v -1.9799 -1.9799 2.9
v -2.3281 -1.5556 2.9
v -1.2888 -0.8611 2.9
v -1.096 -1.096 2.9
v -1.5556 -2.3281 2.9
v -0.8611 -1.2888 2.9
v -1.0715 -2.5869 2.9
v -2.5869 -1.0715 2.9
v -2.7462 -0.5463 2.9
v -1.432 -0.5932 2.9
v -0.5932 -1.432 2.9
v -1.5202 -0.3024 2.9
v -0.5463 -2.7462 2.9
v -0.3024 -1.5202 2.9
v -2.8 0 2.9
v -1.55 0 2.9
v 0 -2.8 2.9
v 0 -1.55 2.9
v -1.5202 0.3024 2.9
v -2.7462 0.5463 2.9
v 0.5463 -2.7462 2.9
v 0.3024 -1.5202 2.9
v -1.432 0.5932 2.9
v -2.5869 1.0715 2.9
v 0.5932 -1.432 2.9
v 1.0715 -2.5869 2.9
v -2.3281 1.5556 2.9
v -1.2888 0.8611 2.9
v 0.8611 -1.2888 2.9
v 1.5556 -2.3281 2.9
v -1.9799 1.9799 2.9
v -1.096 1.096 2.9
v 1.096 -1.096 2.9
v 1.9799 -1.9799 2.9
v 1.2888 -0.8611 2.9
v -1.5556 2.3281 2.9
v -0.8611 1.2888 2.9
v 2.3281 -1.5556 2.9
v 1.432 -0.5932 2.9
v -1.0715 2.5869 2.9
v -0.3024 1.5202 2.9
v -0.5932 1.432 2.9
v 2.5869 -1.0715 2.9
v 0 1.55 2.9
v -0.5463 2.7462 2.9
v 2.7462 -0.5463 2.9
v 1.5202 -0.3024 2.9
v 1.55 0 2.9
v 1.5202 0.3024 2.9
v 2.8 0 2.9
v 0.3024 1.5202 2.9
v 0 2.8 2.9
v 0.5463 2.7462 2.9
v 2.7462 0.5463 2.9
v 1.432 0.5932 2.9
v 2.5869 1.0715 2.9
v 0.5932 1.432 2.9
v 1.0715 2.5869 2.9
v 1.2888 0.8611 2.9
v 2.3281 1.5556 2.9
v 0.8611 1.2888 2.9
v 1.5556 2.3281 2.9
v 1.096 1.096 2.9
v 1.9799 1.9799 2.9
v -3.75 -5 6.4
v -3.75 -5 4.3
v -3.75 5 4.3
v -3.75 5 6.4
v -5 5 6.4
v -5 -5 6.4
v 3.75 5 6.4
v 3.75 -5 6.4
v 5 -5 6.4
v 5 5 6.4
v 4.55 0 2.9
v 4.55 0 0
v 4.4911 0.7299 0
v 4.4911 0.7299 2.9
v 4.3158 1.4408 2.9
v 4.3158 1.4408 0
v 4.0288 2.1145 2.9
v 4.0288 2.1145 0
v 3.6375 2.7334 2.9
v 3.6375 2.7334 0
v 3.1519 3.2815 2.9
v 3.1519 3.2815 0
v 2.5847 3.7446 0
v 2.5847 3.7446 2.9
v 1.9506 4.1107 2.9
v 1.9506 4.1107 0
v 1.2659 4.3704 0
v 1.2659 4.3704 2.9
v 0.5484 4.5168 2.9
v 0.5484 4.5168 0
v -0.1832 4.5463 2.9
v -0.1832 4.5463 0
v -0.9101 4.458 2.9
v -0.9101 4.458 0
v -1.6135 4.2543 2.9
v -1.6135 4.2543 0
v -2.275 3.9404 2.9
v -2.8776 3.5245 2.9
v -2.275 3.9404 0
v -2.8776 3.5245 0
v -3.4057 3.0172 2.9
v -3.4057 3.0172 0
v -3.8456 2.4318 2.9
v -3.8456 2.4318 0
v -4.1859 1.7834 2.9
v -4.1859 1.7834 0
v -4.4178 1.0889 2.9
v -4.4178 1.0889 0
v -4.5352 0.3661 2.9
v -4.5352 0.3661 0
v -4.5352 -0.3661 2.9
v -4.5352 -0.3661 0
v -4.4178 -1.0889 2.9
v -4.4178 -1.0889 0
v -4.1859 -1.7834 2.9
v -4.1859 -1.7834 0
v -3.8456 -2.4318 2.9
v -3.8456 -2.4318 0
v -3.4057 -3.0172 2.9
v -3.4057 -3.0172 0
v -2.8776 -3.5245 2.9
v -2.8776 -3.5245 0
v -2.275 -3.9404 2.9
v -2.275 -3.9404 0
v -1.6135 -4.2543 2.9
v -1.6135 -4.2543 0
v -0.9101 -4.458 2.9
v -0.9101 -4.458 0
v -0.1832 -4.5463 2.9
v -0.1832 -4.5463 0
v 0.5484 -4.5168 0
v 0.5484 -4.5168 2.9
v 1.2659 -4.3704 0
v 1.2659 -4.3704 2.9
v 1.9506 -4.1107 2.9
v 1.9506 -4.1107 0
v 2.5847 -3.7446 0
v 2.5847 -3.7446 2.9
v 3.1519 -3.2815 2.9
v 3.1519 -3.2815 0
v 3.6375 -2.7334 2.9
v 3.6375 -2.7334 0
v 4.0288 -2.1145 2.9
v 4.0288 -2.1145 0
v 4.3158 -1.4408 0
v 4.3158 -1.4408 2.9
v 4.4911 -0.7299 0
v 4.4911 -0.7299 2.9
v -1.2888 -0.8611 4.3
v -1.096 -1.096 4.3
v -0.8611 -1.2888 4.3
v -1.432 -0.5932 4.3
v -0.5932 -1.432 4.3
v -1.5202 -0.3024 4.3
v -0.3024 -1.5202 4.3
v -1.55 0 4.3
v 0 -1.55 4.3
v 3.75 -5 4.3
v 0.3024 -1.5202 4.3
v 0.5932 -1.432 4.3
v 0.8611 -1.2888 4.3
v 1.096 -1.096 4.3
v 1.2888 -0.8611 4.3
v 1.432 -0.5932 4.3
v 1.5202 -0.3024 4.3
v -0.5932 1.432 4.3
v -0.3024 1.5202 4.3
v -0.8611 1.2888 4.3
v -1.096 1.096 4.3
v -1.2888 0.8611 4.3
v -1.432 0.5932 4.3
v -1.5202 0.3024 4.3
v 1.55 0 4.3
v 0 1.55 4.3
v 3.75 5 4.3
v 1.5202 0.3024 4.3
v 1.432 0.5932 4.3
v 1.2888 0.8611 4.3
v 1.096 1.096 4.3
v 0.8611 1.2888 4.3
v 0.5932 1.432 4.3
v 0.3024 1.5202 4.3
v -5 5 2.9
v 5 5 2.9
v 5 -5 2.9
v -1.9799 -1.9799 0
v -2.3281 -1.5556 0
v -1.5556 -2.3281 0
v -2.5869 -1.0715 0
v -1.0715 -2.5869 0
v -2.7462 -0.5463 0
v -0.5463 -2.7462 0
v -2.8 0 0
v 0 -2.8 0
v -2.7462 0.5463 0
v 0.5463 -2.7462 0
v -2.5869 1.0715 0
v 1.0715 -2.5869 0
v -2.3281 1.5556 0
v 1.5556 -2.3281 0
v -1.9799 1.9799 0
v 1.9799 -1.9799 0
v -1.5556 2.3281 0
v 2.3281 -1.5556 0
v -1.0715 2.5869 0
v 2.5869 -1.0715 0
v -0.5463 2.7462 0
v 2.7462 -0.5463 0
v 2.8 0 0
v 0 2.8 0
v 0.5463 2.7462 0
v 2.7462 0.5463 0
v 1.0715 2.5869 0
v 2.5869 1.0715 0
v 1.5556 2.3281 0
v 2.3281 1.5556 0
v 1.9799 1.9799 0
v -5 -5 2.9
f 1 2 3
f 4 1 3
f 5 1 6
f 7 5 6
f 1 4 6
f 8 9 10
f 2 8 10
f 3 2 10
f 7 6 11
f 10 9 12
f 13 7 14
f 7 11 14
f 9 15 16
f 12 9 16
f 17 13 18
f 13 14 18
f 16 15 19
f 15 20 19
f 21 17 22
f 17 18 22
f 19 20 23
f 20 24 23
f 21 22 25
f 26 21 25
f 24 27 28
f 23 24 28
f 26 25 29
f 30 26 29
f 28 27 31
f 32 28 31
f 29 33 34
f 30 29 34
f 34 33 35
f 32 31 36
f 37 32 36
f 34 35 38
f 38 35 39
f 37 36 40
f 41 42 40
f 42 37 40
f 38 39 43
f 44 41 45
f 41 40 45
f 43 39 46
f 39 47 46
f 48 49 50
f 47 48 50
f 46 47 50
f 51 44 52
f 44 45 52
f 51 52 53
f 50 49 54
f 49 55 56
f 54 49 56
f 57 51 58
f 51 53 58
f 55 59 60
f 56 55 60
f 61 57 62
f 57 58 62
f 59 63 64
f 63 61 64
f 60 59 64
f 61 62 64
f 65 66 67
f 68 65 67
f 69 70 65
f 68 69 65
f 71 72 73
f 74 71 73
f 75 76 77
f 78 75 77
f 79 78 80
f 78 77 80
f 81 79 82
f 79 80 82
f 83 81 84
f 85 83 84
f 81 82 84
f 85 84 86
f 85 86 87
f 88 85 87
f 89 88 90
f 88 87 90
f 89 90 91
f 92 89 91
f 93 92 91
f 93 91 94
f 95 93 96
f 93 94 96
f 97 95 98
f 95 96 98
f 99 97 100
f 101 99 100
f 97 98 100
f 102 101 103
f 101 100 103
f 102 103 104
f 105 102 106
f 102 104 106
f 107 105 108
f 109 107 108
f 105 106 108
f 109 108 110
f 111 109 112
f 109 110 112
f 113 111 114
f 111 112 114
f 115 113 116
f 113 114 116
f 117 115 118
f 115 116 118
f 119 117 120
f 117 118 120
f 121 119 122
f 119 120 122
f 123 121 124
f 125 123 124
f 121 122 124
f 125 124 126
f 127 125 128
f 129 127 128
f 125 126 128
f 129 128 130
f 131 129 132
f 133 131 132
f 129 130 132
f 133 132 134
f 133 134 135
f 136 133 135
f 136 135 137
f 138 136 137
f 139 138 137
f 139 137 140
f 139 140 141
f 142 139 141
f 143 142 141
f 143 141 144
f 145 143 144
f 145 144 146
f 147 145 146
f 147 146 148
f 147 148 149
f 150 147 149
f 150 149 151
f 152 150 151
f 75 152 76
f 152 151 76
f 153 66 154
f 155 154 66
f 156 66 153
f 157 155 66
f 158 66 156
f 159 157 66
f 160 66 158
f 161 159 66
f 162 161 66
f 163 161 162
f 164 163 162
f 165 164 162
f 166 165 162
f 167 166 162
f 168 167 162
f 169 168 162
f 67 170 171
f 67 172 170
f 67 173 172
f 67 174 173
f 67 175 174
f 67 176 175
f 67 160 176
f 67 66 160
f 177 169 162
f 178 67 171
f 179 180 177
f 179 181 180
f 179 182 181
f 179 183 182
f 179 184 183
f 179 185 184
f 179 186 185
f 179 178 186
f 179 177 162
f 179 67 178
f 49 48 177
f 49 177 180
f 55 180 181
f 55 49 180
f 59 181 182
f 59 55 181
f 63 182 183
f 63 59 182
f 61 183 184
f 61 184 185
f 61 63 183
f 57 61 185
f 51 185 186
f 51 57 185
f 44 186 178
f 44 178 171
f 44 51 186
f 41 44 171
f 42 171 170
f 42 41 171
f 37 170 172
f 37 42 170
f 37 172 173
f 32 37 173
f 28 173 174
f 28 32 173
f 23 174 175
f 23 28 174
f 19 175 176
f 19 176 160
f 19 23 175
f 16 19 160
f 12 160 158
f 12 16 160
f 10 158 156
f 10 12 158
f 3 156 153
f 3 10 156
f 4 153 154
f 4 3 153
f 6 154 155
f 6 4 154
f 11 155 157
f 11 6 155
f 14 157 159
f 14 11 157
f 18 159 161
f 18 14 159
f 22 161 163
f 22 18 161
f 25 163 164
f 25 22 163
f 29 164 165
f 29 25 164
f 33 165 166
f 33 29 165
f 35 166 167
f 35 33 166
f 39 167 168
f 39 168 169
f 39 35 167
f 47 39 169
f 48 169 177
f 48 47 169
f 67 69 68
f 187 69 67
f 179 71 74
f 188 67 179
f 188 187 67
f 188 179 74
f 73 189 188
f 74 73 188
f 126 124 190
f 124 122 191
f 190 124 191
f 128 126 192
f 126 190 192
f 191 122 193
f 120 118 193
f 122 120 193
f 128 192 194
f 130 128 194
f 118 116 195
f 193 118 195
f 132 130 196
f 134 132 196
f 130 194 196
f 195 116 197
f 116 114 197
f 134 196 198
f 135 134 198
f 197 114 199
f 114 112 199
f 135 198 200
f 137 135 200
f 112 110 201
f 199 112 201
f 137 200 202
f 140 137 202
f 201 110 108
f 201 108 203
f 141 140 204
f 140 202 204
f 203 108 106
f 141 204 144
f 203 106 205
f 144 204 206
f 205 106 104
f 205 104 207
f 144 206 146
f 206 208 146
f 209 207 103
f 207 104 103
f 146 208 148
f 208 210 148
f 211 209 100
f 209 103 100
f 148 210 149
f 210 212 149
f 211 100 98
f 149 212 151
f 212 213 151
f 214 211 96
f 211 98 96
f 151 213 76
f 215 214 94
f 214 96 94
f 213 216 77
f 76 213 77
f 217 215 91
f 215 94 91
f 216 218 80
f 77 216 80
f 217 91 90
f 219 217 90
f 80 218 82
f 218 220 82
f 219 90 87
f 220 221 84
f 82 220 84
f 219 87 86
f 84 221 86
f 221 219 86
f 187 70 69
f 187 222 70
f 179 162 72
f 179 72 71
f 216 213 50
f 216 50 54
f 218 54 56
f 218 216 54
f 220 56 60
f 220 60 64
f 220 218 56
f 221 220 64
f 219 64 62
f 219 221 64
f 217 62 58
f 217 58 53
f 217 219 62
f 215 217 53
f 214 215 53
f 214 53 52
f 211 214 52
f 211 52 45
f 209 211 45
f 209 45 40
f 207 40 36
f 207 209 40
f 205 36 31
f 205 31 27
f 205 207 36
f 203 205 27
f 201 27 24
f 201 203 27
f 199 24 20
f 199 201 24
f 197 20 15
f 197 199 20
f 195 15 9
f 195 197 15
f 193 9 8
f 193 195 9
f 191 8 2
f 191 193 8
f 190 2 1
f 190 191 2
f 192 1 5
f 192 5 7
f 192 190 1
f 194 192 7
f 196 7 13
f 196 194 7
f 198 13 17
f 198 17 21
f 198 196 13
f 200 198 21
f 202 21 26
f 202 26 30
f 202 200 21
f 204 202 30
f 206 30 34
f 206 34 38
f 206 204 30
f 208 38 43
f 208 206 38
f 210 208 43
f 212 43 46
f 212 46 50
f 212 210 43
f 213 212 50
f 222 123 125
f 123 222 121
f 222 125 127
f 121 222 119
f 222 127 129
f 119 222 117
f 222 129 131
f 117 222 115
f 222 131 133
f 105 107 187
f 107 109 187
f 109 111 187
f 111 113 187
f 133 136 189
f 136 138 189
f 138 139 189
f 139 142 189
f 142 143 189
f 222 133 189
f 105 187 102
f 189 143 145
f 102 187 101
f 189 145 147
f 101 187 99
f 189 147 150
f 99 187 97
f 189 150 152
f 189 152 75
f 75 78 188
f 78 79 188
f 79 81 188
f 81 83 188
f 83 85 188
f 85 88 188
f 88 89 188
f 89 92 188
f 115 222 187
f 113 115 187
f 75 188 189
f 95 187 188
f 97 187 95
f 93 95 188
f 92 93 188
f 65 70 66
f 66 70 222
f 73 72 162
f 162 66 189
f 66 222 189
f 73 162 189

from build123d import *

# Parameters (mm, degrees)
SKETCH_1_R      = 4.55
SKETCH_1_R_2    = 2.8
EXTRUDE_1_DEPTH = 2.9
SKETCH_2_W      = 10
SKETCH_2_H      = 10
SKETCH_2_R      = 1.55
EXTRUDE_2_DEPTH = 1.4
SKETCH_3_W      = 1.25
SKETCH_3_H      = 10
EXTRUDE_3_DEPTH = 2.1


with BuildPart() as part:
    # Эскиз1 → Вытянуть1 (new body)
    with BuildSketch(Plane.XY):
        Circle(SKETCH_1_R)
        Circle(SKETCH_1_R_2, mode=Mode.SUBTRACT)
    extrude(amount=EXTRUDE_1_DEPTH)

    # Эскиз2 → Вытянуть2 (add)
    with BuildSketch(Plane.XY.offset(2.9)):
        Rectangle(SKETCH_2_W, SKETCH_2_H)
        Circle(SKETCH_2_R, mode=Mode.SUBTRACT)
    extrude(amount=EXTRUDE_2_DEPTH)

    # Эскиз3 → Вытянуть3 (add)
    with BuildSketch(Plane.XY.offset(4.3)):
        with Locations((-4.375, 0)):
            Rectangle(SKETCH_3_W, SKETCH_3_H)
        with Locations((4.375, 0)):
            Rectangle(SKETCH_3_W, SKETCH_3_H)
    extrude(amount=EXTRUDE_3_DEPTH)


solid = part.part
